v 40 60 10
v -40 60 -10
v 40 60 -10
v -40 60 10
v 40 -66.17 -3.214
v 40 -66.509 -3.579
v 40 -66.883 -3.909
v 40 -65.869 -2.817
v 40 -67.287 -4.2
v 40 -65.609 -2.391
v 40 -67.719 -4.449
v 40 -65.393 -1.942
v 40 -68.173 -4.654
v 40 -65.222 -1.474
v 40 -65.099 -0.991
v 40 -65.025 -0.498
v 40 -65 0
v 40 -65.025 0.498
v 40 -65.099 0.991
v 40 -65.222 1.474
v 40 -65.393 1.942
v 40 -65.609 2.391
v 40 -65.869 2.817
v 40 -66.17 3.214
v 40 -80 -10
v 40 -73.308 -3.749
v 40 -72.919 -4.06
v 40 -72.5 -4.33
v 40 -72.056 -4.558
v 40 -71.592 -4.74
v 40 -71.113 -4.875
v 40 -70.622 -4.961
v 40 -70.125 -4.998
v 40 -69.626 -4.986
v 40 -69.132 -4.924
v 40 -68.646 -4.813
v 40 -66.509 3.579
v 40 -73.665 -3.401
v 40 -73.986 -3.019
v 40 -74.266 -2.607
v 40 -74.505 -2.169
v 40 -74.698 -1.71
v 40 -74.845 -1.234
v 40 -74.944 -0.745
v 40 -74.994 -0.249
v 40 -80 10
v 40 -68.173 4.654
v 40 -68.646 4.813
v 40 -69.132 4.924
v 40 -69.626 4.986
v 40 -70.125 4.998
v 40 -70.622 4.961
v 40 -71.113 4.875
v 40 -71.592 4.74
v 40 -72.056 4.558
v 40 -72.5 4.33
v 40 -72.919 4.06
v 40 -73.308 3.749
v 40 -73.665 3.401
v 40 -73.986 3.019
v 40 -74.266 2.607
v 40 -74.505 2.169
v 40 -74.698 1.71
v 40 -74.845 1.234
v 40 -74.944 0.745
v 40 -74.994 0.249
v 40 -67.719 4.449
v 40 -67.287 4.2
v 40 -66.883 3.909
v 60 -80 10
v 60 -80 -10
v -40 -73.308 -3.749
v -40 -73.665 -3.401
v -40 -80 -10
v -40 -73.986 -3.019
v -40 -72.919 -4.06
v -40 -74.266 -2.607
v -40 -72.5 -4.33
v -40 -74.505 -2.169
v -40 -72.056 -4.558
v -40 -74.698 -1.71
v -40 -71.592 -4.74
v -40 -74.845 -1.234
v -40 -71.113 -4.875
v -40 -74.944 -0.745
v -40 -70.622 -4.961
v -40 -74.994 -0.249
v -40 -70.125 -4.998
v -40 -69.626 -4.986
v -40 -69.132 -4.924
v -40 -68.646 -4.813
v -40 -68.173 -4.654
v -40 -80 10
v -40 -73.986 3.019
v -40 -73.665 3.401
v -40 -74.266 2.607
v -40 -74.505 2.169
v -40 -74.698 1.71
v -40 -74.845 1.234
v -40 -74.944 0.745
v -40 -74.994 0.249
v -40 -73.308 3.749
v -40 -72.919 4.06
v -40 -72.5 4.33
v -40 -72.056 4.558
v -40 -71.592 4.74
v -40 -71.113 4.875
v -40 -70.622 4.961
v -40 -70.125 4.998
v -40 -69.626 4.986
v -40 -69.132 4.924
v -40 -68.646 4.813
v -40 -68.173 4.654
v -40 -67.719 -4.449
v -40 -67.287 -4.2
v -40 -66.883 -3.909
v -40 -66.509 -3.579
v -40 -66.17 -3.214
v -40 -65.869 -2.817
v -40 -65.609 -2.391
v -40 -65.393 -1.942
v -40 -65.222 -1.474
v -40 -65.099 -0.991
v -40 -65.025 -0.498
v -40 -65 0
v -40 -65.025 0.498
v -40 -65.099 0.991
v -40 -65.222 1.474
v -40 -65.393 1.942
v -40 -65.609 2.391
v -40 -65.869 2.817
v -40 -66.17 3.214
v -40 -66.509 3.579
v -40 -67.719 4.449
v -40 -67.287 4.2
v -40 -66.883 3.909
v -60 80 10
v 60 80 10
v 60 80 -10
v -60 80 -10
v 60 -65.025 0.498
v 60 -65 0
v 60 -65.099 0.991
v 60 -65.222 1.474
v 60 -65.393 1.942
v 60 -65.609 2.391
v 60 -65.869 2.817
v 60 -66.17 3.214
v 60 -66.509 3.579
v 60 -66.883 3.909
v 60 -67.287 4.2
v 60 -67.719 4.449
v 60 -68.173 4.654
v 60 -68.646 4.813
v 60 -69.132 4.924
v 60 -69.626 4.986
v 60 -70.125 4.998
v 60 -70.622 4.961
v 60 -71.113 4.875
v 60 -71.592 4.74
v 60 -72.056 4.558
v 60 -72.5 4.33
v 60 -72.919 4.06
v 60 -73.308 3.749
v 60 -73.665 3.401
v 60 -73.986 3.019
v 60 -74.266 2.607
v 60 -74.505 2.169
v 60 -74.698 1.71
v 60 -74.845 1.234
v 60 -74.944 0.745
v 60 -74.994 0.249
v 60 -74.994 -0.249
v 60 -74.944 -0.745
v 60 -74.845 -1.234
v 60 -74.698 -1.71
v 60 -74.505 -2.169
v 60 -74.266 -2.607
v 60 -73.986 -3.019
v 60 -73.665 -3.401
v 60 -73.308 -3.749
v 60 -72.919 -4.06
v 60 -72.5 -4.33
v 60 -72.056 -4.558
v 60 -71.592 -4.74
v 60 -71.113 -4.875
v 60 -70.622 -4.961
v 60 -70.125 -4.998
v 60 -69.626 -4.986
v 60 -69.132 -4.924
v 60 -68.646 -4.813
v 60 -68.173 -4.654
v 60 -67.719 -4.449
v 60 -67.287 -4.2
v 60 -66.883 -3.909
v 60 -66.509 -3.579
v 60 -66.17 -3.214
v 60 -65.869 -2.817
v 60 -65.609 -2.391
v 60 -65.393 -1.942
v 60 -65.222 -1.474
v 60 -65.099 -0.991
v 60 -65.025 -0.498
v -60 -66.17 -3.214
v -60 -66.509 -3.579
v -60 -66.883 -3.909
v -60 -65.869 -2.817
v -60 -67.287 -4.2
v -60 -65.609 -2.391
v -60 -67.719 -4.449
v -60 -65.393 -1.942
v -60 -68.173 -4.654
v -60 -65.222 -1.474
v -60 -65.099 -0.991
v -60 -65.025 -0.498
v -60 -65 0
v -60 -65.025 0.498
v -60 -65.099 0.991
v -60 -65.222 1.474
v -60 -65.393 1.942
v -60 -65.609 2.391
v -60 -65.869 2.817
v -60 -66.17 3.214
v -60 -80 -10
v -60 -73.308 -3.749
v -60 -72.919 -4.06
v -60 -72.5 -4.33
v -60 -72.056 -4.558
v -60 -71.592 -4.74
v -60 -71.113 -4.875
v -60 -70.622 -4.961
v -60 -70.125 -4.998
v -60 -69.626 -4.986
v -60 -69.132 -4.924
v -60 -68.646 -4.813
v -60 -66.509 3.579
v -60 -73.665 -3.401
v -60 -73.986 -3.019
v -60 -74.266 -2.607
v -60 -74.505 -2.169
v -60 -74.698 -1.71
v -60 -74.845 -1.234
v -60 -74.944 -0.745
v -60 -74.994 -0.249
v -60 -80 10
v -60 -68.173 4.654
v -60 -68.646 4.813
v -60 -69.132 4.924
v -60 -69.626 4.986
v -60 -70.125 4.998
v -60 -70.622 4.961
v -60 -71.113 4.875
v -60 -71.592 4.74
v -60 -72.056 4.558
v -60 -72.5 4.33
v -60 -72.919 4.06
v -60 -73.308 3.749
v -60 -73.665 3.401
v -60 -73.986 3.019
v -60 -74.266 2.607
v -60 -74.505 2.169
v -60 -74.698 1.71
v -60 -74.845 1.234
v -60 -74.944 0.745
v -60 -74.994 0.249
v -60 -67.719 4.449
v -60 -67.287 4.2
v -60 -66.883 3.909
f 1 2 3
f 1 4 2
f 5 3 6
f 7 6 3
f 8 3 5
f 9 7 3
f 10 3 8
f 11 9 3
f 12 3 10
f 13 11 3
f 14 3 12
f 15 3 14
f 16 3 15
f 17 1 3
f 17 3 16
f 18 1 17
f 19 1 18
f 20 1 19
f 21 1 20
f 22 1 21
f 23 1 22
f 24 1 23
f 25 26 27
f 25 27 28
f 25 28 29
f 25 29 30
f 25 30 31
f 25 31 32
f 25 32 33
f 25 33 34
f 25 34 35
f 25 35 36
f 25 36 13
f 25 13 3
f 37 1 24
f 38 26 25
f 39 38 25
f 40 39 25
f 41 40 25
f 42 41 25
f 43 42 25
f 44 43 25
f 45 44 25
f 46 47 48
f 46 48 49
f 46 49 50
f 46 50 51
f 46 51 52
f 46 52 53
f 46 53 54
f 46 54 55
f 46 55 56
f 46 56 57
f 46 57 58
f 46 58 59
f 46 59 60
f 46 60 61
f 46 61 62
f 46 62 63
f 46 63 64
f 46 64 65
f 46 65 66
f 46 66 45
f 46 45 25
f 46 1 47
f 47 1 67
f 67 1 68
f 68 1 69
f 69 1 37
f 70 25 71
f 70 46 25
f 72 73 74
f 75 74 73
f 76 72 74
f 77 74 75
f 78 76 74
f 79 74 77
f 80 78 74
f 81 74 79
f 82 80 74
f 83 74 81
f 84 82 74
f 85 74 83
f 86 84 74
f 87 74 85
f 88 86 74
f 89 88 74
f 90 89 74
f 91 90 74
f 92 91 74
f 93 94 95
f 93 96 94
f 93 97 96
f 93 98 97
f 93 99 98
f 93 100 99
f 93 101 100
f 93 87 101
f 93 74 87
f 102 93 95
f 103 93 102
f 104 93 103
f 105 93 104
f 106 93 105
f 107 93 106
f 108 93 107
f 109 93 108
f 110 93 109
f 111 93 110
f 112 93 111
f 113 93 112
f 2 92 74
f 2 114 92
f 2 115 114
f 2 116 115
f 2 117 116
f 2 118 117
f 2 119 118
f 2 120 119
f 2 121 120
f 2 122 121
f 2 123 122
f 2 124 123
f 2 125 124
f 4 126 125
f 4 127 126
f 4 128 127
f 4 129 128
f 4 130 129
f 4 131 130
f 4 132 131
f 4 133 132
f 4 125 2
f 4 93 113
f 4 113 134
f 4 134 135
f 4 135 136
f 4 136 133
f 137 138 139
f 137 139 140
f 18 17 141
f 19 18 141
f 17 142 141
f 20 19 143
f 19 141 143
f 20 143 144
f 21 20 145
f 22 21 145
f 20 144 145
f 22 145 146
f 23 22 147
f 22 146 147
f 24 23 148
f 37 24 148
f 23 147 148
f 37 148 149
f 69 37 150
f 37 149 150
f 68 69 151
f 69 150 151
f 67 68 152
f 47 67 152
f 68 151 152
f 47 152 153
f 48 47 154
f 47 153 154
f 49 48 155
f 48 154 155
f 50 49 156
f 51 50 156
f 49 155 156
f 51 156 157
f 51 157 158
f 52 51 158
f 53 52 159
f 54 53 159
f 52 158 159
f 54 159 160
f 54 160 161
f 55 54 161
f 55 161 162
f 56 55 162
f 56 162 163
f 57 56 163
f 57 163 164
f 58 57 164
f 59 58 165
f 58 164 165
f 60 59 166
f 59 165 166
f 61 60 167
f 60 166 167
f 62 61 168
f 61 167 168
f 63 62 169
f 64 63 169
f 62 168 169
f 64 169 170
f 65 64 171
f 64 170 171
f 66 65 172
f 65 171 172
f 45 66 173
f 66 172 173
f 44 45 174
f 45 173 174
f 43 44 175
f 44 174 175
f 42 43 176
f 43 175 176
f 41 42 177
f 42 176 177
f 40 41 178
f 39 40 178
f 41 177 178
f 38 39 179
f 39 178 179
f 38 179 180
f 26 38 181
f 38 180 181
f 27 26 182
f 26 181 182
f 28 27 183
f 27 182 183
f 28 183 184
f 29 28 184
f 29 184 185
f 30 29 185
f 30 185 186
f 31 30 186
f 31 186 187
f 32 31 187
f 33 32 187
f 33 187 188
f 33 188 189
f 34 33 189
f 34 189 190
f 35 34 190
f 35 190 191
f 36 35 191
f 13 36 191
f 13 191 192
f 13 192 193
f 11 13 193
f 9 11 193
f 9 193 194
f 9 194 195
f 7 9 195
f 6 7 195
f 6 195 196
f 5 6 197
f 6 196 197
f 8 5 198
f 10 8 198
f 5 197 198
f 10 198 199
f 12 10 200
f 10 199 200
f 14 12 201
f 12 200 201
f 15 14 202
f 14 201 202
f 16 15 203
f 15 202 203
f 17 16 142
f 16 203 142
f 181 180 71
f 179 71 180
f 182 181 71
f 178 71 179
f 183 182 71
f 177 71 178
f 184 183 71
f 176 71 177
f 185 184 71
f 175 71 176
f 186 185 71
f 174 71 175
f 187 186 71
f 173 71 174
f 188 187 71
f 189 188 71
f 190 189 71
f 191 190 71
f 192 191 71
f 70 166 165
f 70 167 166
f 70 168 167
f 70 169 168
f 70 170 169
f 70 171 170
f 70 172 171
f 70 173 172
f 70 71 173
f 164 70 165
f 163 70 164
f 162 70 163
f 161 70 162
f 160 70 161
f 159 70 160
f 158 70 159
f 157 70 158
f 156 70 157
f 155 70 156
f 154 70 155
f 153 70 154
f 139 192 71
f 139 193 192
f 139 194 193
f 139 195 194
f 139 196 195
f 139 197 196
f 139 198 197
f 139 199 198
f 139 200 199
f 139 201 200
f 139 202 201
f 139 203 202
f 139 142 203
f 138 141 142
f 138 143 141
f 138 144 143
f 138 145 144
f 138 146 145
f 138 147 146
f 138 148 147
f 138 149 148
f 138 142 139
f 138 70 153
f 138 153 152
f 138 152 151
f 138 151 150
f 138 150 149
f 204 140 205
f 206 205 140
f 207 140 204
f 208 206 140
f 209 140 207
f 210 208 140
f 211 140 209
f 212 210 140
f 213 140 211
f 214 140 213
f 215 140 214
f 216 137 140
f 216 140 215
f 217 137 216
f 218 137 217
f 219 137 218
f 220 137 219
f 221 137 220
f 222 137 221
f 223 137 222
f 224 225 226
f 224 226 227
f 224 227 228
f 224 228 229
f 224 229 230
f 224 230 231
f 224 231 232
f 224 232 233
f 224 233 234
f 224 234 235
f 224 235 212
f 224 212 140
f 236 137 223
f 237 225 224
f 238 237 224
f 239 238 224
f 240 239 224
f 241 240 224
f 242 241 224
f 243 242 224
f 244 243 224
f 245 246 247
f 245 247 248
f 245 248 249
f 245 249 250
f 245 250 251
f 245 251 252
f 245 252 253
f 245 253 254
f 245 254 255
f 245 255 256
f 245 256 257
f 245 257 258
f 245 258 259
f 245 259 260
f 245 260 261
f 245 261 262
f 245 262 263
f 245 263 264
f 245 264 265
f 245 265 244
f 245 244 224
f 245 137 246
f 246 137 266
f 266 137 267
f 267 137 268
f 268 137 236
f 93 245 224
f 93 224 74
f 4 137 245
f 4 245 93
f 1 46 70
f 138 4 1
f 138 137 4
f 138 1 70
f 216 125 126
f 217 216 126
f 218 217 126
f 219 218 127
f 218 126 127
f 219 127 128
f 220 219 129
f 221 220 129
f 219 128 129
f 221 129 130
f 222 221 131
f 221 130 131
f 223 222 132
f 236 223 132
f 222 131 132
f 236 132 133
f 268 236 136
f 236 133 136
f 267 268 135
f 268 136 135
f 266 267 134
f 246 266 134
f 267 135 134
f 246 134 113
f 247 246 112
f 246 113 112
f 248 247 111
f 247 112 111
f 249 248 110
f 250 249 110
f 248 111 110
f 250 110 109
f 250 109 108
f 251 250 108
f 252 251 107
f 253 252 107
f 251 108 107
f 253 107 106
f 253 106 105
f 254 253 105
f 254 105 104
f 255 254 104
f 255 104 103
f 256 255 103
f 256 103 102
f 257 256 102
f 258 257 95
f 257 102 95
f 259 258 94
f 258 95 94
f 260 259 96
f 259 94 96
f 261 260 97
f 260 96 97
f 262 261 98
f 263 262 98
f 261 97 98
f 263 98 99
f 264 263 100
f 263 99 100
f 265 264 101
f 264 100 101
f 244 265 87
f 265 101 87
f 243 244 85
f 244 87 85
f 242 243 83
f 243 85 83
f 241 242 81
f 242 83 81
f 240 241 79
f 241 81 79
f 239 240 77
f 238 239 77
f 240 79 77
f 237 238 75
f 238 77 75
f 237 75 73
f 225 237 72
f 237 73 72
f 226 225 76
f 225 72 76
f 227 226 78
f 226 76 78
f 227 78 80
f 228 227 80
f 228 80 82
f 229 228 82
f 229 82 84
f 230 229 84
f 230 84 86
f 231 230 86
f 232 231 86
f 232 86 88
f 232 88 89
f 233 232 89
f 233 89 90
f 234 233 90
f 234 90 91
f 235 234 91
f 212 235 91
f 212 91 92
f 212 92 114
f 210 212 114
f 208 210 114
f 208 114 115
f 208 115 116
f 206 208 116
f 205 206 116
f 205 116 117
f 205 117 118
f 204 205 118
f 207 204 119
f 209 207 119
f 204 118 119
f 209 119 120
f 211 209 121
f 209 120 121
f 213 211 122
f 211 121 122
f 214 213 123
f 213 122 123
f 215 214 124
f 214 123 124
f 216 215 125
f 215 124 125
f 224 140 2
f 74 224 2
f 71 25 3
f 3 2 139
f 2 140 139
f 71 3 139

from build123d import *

# Parameters (mm, degrees)
F1_DEPTH = 10
F2_R     = 5
F3_DEPTH = 60


with BuildPart() as f1:
    # F0 (on Top) → F1 (new body, symmetric)
    with BuildSketch(Plane.XY):
        Polygon((40, -80), (60, -80), (60, 80), (-60, 80), (-60, -80), (-40, -80), (-40, -60), (-40, 60), (40, 60), (40, -60), align=None)
    extrude(amount=F1_DEPTH, both=True)

    # F2 (on Right) → F3 (cut, symmetric)
    with BuildSketch(Plane.YZ):
        with Locations((-70, 0)):
            Circle(F2_R)
    extrude(amount=F3_DEPTH, both=True, mode=Mode.SUBTRACT)


solid = f1.part
